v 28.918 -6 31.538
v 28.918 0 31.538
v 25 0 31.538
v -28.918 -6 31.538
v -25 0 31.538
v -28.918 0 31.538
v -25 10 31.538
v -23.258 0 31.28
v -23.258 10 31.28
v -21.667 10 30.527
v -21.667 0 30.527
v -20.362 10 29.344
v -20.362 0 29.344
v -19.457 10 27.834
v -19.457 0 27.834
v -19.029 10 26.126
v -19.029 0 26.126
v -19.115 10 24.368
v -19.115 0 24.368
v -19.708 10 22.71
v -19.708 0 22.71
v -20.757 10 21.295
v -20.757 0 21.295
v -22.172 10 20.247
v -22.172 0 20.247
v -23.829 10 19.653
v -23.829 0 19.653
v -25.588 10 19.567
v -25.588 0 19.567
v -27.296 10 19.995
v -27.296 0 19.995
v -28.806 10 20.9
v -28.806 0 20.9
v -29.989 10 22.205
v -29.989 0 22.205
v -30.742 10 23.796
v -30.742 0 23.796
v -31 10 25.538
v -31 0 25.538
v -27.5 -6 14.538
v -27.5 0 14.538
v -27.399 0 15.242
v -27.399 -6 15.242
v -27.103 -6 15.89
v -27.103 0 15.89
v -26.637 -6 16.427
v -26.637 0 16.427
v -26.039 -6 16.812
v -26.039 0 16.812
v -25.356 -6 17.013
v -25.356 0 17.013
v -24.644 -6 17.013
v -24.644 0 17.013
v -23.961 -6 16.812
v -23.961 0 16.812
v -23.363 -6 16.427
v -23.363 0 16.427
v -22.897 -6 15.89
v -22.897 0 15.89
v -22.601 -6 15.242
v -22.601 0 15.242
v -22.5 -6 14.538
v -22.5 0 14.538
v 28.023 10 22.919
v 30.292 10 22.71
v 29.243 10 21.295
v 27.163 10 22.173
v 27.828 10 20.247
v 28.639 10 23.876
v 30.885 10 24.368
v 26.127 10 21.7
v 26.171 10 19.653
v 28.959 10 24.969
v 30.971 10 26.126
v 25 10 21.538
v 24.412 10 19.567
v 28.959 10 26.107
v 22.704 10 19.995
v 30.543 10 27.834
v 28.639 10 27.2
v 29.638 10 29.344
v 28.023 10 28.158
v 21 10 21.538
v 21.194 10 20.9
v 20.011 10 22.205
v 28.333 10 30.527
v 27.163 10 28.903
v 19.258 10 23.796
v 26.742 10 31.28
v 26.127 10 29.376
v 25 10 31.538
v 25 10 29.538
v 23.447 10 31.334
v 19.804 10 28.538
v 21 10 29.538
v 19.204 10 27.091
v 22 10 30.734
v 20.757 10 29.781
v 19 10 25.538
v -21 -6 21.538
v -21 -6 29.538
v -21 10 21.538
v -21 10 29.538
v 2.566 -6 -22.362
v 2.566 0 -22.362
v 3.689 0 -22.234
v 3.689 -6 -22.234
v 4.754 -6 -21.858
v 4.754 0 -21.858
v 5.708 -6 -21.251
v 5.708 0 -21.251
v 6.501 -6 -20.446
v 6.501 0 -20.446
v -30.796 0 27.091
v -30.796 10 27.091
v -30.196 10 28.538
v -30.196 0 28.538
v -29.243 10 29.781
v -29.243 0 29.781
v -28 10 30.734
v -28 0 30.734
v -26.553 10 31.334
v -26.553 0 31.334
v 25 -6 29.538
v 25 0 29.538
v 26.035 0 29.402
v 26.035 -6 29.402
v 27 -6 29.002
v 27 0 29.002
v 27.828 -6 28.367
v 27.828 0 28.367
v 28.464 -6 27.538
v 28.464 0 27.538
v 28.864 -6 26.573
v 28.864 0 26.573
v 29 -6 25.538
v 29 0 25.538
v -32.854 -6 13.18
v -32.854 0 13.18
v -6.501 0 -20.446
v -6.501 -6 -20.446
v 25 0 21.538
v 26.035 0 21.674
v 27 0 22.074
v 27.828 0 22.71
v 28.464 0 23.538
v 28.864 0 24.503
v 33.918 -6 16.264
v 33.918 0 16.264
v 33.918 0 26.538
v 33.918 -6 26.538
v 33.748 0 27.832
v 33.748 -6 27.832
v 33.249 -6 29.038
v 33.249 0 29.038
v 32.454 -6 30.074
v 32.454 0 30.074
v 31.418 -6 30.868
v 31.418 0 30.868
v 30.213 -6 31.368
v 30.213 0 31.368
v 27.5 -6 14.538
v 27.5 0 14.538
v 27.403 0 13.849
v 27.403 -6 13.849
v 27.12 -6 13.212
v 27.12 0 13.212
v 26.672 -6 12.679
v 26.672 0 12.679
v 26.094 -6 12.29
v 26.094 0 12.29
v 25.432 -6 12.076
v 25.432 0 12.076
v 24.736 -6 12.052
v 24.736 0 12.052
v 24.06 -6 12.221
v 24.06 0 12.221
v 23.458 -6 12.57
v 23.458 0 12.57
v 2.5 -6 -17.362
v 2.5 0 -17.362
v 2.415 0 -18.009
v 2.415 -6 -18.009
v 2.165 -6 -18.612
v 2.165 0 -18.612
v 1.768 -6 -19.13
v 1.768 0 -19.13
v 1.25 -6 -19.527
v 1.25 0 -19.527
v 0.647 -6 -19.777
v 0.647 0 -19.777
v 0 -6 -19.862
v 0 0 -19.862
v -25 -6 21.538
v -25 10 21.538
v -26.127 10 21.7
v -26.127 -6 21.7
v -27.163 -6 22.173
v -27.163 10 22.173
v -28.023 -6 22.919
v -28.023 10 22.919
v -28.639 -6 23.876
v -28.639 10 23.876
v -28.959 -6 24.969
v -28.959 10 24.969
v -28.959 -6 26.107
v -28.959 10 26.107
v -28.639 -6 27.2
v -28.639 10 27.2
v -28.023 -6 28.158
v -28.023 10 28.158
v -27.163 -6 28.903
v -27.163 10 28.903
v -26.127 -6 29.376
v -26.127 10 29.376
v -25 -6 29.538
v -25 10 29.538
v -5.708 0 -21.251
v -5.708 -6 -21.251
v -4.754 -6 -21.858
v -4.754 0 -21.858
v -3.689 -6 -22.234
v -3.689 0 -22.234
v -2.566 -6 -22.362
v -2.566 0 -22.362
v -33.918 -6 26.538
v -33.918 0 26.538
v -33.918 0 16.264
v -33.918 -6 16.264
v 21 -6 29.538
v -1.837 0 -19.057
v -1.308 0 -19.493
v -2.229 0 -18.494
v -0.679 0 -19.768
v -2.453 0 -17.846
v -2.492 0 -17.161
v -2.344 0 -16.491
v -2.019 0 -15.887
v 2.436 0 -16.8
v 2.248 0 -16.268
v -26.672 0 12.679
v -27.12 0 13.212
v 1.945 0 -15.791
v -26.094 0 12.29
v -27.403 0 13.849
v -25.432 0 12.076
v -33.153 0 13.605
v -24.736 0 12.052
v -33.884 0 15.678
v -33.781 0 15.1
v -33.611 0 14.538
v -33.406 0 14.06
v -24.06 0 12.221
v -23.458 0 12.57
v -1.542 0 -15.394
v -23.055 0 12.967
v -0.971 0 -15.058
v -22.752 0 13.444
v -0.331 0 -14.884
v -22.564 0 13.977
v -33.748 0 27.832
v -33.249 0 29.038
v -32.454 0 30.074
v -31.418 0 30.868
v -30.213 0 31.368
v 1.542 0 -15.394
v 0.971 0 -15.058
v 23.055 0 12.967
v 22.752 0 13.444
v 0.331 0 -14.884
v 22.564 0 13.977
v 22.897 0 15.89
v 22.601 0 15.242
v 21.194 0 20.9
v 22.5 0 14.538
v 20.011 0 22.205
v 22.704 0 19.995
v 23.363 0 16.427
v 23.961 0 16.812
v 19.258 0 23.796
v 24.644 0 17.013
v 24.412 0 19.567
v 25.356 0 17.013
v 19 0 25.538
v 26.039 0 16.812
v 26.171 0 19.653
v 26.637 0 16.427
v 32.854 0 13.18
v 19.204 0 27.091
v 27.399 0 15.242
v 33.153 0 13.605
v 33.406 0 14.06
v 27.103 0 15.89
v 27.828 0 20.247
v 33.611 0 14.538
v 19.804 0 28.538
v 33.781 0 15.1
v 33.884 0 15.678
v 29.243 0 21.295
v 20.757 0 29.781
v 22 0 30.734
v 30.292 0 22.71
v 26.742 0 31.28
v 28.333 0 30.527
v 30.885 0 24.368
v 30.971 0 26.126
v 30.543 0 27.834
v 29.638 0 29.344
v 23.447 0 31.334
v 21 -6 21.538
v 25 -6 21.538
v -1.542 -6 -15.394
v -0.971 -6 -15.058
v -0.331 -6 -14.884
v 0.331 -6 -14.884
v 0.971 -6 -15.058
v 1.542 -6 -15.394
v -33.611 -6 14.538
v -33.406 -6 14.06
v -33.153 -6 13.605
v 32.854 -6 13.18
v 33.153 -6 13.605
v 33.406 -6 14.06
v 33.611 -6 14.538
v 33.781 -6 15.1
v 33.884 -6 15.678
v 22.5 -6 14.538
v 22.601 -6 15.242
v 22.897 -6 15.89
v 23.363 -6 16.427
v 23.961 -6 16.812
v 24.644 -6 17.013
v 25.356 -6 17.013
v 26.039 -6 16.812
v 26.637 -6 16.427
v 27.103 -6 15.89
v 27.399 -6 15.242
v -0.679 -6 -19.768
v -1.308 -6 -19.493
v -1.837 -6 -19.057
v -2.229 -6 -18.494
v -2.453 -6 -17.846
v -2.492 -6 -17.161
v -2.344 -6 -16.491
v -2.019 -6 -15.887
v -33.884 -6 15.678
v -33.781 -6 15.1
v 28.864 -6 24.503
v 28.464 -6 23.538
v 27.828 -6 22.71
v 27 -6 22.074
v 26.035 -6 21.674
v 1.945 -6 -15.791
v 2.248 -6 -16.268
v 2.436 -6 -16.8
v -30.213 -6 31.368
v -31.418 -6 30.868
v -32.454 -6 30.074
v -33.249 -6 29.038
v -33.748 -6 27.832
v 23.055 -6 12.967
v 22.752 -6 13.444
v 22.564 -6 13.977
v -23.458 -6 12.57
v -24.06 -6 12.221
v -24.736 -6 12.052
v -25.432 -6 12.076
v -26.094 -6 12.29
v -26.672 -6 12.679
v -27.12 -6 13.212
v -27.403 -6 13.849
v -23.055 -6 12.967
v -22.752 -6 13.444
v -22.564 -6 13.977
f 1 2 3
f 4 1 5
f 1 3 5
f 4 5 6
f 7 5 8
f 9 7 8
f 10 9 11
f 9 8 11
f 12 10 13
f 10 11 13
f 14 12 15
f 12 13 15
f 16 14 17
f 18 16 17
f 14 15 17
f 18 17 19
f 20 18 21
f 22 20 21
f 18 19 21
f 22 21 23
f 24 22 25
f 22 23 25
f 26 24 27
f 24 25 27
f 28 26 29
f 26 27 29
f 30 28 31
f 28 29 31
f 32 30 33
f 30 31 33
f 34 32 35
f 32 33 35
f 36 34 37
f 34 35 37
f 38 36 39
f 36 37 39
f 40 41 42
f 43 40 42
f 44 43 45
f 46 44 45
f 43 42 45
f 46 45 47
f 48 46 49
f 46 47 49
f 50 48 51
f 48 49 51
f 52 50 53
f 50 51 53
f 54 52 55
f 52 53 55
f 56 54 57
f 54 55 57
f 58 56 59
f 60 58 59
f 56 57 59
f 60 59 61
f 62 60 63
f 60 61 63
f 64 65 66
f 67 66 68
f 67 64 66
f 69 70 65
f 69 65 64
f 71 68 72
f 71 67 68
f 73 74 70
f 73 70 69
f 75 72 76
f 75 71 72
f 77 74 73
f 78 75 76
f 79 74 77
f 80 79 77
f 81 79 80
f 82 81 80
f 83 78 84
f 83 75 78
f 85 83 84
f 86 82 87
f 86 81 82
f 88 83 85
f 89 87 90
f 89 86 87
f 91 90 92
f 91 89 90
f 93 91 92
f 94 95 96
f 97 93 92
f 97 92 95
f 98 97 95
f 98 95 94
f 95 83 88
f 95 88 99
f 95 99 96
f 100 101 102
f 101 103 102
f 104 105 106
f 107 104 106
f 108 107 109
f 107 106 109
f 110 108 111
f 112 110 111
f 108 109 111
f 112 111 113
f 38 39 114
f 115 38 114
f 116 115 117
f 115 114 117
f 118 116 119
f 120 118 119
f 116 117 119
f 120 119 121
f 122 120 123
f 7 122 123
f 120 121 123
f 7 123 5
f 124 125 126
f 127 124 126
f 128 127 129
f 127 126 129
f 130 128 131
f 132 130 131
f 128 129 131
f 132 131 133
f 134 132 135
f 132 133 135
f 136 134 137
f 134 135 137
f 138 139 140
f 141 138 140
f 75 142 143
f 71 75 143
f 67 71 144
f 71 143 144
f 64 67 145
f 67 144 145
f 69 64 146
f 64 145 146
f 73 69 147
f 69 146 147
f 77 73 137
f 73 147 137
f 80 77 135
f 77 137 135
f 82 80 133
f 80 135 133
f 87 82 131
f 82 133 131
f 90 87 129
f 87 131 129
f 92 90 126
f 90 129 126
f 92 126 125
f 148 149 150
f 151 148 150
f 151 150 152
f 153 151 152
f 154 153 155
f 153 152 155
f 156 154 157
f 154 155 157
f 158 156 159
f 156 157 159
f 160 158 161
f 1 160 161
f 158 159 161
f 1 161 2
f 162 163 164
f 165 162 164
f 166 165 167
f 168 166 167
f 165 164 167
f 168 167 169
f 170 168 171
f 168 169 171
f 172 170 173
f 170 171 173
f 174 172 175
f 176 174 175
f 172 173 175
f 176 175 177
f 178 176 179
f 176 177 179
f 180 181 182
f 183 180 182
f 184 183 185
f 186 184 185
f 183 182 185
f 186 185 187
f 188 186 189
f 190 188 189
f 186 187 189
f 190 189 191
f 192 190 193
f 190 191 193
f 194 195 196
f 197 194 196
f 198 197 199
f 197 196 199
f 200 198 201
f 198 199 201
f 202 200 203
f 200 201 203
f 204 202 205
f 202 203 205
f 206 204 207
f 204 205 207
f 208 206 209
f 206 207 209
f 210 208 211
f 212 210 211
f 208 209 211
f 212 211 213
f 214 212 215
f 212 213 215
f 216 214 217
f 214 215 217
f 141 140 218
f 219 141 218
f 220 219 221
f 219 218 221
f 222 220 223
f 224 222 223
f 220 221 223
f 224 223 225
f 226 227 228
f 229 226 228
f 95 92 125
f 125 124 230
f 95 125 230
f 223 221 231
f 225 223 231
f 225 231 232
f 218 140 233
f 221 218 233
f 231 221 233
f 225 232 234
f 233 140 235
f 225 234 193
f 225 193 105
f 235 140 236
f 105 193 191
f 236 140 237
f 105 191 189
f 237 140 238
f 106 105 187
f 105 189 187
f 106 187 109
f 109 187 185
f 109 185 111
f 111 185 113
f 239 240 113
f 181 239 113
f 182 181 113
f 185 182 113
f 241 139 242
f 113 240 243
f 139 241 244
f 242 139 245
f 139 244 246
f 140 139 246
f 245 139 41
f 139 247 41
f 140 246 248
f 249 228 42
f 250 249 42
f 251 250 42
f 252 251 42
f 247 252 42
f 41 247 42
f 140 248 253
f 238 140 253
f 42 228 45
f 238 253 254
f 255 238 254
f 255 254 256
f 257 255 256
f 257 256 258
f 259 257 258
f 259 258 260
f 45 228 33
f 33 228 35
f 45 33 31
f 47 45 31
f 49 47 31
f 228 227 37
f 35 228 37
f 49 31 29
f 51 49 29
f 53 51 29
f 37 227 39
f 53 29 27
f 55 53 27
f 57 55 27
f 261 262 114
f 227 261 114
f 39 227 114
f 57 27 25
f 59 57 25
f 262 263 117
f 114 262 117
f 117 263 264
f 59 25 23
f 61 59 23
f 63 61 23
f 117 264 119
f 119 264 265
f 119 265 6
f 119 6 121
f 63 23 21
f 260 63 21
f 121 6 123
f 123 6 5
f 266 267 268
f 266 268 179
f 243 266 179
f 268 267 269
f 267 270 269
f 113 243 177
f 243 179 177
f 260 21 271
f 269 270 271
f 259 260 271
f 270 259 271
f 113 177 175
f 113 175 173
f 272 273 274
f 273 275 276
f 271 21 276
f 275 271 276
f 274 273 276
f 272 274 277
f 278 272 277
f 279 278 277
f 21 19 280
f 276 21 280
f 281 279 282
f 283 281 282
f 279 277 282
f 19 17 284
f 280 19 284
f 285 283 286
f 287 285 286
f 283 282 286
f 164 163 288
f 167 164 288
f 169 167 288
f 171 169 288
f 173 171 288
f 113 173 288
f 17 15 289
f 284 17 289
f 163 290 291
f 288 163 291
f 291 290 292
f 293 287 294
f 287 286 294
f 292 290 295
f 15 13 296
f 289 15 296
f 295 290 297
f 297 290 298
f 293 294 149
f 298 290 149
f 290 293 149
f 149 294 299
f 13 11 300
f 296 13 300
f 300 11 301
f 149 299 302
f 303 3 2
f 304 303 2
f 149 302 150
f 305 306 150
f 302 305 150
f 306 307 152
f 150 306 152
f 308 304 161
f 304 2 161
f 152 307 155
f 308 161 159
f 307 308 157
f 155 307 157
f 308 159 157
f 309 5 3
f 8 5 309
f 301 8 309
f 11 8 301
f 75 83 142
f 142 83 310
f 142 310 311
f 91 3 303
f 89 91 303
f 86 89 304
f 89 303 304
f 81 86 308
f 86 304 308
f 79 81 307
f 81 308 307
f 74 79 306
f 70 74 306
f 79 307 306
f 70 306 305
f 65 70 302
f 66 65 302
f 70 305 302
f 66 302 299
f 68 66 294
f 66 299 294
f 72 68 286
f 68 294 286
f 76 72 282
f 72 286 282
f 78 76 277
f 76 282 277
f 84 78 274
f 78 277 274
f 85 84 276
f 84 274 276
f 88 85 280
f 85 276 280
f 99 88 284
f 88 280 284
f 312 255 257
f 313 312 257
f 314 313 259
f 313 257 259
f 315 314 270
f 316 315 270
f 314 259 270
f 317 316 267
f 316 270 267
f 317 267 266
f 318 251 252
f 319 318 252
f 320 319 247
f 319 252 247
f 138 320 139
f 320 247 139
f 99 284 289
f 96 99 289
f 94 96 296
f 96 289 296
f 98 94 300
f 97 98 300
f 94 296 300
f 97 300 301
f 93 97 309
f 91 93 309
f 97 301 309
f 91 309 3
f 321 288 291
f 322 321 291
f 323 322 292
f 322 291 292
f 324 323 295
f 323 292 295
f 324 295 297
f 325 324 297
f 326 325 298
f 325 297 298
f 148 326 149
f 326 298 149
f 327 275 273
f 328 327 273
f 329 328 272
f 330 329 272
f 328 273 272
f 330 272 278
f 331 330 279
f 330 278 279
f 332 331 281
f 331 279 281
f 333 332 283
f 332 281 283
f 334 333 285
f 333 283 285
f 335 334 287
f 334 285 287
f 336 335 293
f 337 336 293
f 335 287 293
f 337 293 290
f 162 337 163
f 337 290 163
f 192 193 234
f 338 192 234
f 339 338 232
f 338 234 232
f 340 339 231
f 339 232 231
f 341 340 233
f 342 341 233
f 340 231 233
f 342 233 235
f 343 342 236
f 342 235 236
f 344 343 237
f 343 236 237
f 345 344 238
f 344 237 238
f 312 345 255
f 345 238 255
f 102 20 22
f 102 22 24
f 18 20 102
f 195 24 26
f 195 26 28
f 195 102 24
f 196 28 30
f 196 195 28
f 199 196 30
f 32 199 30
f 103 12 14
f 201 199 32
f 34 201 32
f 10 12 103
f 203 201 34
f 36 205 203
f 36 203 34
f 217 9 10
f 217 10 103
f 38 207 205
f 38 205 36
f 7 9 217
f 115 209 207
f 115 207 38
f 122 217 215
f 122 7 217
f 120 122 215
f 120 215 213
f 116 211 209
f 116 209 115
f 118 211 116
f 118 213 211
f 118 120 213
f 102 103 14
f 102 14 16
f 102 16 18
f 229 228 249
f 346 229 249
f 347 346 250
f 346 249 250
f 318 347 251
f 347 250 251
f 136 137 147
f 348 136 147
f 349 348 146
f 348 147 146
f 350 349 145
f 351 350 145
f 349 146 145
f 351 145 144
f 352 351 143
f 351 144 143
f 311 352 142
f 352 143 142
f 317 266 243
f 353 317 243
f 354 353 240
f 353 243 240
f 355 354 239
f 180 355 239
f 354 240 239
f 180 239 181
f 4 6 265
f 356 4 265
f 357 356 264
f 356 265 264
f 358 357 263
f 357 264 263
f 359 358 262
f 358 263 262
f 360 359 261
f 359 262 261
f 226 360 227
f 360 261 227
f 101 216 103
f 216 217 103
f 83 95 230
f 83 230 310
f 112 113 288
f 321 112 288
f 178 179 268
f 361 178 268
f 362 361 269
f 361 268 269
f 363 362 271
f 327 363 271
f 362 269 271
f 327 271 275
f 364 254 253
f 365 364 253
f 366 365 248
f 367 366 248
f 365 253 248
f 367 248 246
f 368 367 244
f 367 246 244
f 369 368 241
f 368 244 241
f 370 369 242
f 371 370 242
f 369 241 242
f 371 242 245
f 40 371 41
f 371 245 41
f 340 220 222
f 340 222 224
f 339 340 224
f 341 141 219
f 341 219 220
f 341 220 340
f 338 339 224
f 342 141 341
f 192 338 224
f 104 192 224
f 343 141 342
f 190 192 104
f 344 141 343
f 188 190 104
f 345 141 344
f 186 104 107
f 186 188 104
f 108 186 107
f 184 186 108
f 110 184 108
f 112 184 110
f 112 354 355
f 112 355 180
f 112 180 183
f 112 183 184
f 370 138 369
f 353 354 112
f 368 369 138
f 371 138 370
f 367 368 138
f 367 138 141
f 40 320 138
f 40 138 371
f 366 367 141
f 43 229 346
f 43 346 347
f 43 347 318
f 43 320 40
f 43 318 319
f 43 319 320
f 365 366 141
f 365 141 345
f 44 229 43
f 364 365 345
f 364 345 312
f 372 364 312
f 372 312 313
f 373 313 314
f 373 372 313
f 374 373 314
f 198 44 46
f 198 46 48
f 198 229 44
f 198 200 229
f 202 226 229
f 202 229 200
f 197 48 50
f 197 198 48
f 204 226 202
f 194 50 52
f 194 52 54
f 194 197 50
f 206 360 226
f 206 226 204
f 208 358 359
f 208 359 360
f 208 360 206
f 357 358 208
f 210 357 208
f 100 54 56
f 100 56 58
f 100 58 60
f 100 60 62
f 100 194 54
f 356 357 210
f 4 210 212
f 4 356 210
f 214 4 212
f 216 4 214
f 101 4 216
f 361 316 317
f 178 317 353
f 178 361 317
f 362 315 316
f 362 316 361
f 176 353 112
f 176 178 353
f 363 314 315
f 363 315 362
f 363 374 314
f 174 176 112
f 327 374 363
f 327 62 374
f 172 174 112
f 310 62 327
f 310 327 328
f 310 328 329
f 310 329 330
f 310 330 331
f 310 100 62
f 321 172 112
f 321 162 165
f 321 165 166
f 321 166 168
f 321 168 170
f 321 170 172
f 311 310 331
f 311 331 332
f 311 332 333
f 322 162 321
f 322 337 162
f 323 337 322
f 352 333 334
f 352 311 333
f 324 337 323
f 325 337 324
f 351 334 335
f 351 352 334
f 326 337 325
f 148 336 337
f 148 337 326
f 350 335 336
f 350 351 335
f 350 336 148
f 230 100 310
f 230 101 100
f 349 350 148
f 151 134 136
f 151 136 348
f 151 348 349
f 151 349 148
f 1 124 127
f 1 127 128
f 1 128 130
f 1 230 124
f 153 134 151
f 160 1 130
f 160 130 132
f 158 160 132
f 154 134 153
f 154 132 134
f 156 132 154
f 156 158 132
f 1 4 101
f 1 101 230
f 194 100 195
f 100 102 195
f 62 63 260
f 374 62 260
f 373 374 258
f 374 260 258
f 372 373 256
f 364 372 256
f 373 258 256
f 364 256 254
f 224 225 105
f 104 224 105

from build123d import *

# Parameters (mm, degrees)
F1_DEPTH = 6
F3_DEPTH = 10


with BuildPart() as f1:
    # F0 (on Front) → F1 (new body)
    with BuildSketch(Plane.XZ):
        with BuildLine():
            Line((-22.5, 14.5380757153), (-15.95, 14.5380757153))
            Line((-15.95, 14.5380757153), (15.95, 14.5380757153))
            Line((15.95, 14.5380757153), (22.5, 14.5380757153))
            ThreePointArc((22.5, 14.5380757153), (25, 17.0380757153), (27.5, 14.5380757153))
            Line((27.5, 14.5380757153), (33.6112053721, 14.5380757153))
            ThreePointArc((33.6112053721, 14.5380757153), (33.8410734014, 15.3874164322), (33.9184952978, 16.2639007813))
            Line((33.9184952978, 16.2639007813), (33.9184952978, 19.5380757153))
            Line((33.9184952978, 19.5380757153), (25, 19.5380757153))
            Line((25, 19.5380757153), (-25, 19.5380757153))
            Line((-25, 19.5380757153), (-33.9184952978, 19.5380757153))
            Line((-33.9184952978, 19.5380757153), (-33.9184952978, 16.2639007813))
            ThreePointArc((-33.9184952978, 16.2639007813), (-33.8410734014, 15.3874164322), (-33.6112053721, 14.5380757153))
            Line((-33.6112053721, 14.5380757153), (-27.5, 14.5380757153))
            ThreePointArc((-27.5, 14.5380757153), (-25, 17.0380757153), (-22.5, 14.5380757153))
        make_face()
        with BuildLine():
            Line((15.95, 14.5380757153), (-15.95, 14.5380757153))
            Line((-15.95, 14.5380757153), (-22.5, 14.5380757153))
            ThreePointArc((-22.5, 14.5380757153), (-22.7521952698, 13.4438299043), (-23.457899116, 12.5703549873))
            Line((-23.457899116, 12.5703549873), (-1.542100884, -15.3942035567))
            ThreePointArc((-1.542100884, -15.3942035567), (0, -14.8619242847), (1.542100884, -15.3942035567))
            Line((1.542100884, -15.3942035567), (23.457899116, 12.5703549873))
            ThreePointArc((23.457899116, 12.5703549873), (22.7521952698, 13.4438299043), (22.5, 14.5380757153))
            Line((22.5, 14.5380757153), (15.95, 14.5380757153))
        make_face()
        with BuildLine():
            ThreePointArc((-23.457899116, 12.5703549873), (-26.094245811, 12.2902709851), (-27.5, 14.5380757153))
            Line((-27.5, 14.5380757153), (-33.6112053721, 14.5380757153))
            ThreePointArc((-33.6112053721, 14.5380757153), (-33.28570797, 13.8292645711), (-32.8539367538, 13.1796990132))
            Line((-32.8539367538, 13.1796990132), (-6.5014092727, -20.4461260528))
            ThreePointArc((-6.5014092727, -20.4461260528), (-4.7544594387, -21.8575337451), (-2.5659678166, -22.3619242847))
            Line((-2.5659678166, -22.3619242847), (0, -22.3619242847))
            Line((0, -22.3619242847), (0, -19.8619242847))
            ThreePointArc((0, -19.8619242847), (-2.3631866008, -18.1776136189), (-1.542100884, -15.3942035567))
            Line((-1.542100884, -15.3942035567), (-23.457899116, 12.5703549873))
        make_face()
        with BuildLine():
            Line((33.6112053721, 14.5380757153), (27.5, 14.5380757153))
            ThreePointArc((27.5, 14.5380757153), (26.094245811, 12.2902709851), (23.457899116, 12.5703549873))
            Line((23.457899116, 12.5703549873), (1.542100884, -15.3942035567))
            ThreePointArc((1.542100884, -15.3942035567), (2.2478047302, -16.2676784737), (2.5, -17.3619242847))
            ThreePointArc((2.5, -17.3619242847), (1.767766953, -19.1296912377), (0, -19.8619242847))
            Line((0, -19.8619242847), (0, -22.3619242847))
            Line((0, -22.3619242847), (2.5659678166, -22.3619242847))
            ThreePointArc((2.5659678166, -22.3619242847), (4.7544594387, -21.8575337451), (6.5014092727, -20.4461260528))
            Line((6.5014092727, -20.4461260528), (32.8539367538, 13.1796990132))
            ThreePointArc((32.8539367538, 13.1796990132), (33.28570797, 13.8292645711), (33.6112053721, 14.5380757153))
        make_face()
        with BuildLine():
            Line((-33.9184952978, 26.5380757153), (-33.9184952978, 19.5380757153))
            Line((-33.9184952978, 19.5380757153), (-25, 19.5380757153))
            Line((-25, 19.5380757153), (-25, 21.5380757153))
            ThreePointArc((-25, 21.5380757153), (-29, 25.5380757153), (-25, 29.5380757153))
            Line((-25, 29.5380757153), (-25, 31.5380757153))
            Line((-25, 31.5380757153), (-28.9184952978, 31.5380757153))
            ThreePointArc((-28.9184952978, 31.5380757153), (-32.4540292037, 30.0736096212), (-33.9184952978, 26.5380757153))
        make_face()
        with BuildLine():
            Line((25, 19.5380757153), (33.9184952978, 19.5380757153))
            Line((33.9184952978, 19.5380757153), (33.9184952978, 26.5380757153))
            ThreePointArc((33.9184952978, 26.5380757153), (32.4540292037, 30.0736096212), (28.9184952978, 31.5380757153))
            Line((28.9184952978, 31.5380757153), (25, 31.5380757153))
            Line((25, 31.5380757153), (25, 29.5380757153))
            ThreePointArc((25, 29.5380757153), (27.8284271247, 28.36650284), (29, 25.5380757153))
            ThreePointArc((29, 25.5380757153), (27.8284271247, 22.7096485906), (25, 21.5380757153))
            Line((25, 21.5380757153), (25, 19.5380757153))
        make_face()
        Polygon((-25, 21.5380757153), (-25, 19.5380757153), (25, 19.5380757153), (25, 21.5380757153), (21, 21.5380757153), (21, 25.5380757153), (21, 29.5380757153), (25, 29.5380757153), (25, 31.5380757153), (-25, 31.5380757153), (-25, 29.5380757153), (-21, 29.5380757153), (-21, 25.5380757153), (-21, 21.5380757153), align=None)
    extrude(amount=F1_DEPTH)

    # F2 (on face) → F3 (join)
    with BuildSketch(Plane(origin=(0, 0, 0), x_dir=(-1, 0, 0), z_dir=(0, 1, 0))):
        with BuildLine():
            ThreePointArc((-25, 31.5380757153), (-29.2426406871, 21.2954350282), (-19, 25.5380757153))
            ThreePointArc((-19, 25.5380757153), (-20.7573593129, 29.7807164024), (-25, 31.5380757153))
        make_face()
        with BuildLine():
            Line((-21, 29.5380757153), (-21, 21.5380757153))
            Line((-21, 21.5380757153), (-25, 21.5380757153))
            ThreePointArc((-25, 21.5380757153), (-29, 25.5380757153), (-25, 29.5380757153))
            Line((-25, 29.5380757153), (-21, 29.5380757153))
        make_face(mode=Mode.SUBTRACT)
        with BuildLine():
            ThreePointArc((31, 25.5380757153), (29.2426406871, 29.7807164024), (25, 31.5380757153))
            ThreePointArc((25, 31.5380757153), (20.7573593129, 21.2954350282), (31, 25.5380757153))
        make_face()
        with BuildLine():
            Line((21, 29.5380757153), (25, 29.5380757153))
            ThreePointArc((25, 29.5380757153), (29, 25.5380757153), (25, 21.5380757153))
            Line((25, 21.5380757153), (21, 21.5380757153))
            Line((21, 21.5380757153), (21, 29.5380757153))
        make_face(mode=Mode.SUBTRACT)
    extrude(amount=F3_DEPTH)


solid = f1.part
